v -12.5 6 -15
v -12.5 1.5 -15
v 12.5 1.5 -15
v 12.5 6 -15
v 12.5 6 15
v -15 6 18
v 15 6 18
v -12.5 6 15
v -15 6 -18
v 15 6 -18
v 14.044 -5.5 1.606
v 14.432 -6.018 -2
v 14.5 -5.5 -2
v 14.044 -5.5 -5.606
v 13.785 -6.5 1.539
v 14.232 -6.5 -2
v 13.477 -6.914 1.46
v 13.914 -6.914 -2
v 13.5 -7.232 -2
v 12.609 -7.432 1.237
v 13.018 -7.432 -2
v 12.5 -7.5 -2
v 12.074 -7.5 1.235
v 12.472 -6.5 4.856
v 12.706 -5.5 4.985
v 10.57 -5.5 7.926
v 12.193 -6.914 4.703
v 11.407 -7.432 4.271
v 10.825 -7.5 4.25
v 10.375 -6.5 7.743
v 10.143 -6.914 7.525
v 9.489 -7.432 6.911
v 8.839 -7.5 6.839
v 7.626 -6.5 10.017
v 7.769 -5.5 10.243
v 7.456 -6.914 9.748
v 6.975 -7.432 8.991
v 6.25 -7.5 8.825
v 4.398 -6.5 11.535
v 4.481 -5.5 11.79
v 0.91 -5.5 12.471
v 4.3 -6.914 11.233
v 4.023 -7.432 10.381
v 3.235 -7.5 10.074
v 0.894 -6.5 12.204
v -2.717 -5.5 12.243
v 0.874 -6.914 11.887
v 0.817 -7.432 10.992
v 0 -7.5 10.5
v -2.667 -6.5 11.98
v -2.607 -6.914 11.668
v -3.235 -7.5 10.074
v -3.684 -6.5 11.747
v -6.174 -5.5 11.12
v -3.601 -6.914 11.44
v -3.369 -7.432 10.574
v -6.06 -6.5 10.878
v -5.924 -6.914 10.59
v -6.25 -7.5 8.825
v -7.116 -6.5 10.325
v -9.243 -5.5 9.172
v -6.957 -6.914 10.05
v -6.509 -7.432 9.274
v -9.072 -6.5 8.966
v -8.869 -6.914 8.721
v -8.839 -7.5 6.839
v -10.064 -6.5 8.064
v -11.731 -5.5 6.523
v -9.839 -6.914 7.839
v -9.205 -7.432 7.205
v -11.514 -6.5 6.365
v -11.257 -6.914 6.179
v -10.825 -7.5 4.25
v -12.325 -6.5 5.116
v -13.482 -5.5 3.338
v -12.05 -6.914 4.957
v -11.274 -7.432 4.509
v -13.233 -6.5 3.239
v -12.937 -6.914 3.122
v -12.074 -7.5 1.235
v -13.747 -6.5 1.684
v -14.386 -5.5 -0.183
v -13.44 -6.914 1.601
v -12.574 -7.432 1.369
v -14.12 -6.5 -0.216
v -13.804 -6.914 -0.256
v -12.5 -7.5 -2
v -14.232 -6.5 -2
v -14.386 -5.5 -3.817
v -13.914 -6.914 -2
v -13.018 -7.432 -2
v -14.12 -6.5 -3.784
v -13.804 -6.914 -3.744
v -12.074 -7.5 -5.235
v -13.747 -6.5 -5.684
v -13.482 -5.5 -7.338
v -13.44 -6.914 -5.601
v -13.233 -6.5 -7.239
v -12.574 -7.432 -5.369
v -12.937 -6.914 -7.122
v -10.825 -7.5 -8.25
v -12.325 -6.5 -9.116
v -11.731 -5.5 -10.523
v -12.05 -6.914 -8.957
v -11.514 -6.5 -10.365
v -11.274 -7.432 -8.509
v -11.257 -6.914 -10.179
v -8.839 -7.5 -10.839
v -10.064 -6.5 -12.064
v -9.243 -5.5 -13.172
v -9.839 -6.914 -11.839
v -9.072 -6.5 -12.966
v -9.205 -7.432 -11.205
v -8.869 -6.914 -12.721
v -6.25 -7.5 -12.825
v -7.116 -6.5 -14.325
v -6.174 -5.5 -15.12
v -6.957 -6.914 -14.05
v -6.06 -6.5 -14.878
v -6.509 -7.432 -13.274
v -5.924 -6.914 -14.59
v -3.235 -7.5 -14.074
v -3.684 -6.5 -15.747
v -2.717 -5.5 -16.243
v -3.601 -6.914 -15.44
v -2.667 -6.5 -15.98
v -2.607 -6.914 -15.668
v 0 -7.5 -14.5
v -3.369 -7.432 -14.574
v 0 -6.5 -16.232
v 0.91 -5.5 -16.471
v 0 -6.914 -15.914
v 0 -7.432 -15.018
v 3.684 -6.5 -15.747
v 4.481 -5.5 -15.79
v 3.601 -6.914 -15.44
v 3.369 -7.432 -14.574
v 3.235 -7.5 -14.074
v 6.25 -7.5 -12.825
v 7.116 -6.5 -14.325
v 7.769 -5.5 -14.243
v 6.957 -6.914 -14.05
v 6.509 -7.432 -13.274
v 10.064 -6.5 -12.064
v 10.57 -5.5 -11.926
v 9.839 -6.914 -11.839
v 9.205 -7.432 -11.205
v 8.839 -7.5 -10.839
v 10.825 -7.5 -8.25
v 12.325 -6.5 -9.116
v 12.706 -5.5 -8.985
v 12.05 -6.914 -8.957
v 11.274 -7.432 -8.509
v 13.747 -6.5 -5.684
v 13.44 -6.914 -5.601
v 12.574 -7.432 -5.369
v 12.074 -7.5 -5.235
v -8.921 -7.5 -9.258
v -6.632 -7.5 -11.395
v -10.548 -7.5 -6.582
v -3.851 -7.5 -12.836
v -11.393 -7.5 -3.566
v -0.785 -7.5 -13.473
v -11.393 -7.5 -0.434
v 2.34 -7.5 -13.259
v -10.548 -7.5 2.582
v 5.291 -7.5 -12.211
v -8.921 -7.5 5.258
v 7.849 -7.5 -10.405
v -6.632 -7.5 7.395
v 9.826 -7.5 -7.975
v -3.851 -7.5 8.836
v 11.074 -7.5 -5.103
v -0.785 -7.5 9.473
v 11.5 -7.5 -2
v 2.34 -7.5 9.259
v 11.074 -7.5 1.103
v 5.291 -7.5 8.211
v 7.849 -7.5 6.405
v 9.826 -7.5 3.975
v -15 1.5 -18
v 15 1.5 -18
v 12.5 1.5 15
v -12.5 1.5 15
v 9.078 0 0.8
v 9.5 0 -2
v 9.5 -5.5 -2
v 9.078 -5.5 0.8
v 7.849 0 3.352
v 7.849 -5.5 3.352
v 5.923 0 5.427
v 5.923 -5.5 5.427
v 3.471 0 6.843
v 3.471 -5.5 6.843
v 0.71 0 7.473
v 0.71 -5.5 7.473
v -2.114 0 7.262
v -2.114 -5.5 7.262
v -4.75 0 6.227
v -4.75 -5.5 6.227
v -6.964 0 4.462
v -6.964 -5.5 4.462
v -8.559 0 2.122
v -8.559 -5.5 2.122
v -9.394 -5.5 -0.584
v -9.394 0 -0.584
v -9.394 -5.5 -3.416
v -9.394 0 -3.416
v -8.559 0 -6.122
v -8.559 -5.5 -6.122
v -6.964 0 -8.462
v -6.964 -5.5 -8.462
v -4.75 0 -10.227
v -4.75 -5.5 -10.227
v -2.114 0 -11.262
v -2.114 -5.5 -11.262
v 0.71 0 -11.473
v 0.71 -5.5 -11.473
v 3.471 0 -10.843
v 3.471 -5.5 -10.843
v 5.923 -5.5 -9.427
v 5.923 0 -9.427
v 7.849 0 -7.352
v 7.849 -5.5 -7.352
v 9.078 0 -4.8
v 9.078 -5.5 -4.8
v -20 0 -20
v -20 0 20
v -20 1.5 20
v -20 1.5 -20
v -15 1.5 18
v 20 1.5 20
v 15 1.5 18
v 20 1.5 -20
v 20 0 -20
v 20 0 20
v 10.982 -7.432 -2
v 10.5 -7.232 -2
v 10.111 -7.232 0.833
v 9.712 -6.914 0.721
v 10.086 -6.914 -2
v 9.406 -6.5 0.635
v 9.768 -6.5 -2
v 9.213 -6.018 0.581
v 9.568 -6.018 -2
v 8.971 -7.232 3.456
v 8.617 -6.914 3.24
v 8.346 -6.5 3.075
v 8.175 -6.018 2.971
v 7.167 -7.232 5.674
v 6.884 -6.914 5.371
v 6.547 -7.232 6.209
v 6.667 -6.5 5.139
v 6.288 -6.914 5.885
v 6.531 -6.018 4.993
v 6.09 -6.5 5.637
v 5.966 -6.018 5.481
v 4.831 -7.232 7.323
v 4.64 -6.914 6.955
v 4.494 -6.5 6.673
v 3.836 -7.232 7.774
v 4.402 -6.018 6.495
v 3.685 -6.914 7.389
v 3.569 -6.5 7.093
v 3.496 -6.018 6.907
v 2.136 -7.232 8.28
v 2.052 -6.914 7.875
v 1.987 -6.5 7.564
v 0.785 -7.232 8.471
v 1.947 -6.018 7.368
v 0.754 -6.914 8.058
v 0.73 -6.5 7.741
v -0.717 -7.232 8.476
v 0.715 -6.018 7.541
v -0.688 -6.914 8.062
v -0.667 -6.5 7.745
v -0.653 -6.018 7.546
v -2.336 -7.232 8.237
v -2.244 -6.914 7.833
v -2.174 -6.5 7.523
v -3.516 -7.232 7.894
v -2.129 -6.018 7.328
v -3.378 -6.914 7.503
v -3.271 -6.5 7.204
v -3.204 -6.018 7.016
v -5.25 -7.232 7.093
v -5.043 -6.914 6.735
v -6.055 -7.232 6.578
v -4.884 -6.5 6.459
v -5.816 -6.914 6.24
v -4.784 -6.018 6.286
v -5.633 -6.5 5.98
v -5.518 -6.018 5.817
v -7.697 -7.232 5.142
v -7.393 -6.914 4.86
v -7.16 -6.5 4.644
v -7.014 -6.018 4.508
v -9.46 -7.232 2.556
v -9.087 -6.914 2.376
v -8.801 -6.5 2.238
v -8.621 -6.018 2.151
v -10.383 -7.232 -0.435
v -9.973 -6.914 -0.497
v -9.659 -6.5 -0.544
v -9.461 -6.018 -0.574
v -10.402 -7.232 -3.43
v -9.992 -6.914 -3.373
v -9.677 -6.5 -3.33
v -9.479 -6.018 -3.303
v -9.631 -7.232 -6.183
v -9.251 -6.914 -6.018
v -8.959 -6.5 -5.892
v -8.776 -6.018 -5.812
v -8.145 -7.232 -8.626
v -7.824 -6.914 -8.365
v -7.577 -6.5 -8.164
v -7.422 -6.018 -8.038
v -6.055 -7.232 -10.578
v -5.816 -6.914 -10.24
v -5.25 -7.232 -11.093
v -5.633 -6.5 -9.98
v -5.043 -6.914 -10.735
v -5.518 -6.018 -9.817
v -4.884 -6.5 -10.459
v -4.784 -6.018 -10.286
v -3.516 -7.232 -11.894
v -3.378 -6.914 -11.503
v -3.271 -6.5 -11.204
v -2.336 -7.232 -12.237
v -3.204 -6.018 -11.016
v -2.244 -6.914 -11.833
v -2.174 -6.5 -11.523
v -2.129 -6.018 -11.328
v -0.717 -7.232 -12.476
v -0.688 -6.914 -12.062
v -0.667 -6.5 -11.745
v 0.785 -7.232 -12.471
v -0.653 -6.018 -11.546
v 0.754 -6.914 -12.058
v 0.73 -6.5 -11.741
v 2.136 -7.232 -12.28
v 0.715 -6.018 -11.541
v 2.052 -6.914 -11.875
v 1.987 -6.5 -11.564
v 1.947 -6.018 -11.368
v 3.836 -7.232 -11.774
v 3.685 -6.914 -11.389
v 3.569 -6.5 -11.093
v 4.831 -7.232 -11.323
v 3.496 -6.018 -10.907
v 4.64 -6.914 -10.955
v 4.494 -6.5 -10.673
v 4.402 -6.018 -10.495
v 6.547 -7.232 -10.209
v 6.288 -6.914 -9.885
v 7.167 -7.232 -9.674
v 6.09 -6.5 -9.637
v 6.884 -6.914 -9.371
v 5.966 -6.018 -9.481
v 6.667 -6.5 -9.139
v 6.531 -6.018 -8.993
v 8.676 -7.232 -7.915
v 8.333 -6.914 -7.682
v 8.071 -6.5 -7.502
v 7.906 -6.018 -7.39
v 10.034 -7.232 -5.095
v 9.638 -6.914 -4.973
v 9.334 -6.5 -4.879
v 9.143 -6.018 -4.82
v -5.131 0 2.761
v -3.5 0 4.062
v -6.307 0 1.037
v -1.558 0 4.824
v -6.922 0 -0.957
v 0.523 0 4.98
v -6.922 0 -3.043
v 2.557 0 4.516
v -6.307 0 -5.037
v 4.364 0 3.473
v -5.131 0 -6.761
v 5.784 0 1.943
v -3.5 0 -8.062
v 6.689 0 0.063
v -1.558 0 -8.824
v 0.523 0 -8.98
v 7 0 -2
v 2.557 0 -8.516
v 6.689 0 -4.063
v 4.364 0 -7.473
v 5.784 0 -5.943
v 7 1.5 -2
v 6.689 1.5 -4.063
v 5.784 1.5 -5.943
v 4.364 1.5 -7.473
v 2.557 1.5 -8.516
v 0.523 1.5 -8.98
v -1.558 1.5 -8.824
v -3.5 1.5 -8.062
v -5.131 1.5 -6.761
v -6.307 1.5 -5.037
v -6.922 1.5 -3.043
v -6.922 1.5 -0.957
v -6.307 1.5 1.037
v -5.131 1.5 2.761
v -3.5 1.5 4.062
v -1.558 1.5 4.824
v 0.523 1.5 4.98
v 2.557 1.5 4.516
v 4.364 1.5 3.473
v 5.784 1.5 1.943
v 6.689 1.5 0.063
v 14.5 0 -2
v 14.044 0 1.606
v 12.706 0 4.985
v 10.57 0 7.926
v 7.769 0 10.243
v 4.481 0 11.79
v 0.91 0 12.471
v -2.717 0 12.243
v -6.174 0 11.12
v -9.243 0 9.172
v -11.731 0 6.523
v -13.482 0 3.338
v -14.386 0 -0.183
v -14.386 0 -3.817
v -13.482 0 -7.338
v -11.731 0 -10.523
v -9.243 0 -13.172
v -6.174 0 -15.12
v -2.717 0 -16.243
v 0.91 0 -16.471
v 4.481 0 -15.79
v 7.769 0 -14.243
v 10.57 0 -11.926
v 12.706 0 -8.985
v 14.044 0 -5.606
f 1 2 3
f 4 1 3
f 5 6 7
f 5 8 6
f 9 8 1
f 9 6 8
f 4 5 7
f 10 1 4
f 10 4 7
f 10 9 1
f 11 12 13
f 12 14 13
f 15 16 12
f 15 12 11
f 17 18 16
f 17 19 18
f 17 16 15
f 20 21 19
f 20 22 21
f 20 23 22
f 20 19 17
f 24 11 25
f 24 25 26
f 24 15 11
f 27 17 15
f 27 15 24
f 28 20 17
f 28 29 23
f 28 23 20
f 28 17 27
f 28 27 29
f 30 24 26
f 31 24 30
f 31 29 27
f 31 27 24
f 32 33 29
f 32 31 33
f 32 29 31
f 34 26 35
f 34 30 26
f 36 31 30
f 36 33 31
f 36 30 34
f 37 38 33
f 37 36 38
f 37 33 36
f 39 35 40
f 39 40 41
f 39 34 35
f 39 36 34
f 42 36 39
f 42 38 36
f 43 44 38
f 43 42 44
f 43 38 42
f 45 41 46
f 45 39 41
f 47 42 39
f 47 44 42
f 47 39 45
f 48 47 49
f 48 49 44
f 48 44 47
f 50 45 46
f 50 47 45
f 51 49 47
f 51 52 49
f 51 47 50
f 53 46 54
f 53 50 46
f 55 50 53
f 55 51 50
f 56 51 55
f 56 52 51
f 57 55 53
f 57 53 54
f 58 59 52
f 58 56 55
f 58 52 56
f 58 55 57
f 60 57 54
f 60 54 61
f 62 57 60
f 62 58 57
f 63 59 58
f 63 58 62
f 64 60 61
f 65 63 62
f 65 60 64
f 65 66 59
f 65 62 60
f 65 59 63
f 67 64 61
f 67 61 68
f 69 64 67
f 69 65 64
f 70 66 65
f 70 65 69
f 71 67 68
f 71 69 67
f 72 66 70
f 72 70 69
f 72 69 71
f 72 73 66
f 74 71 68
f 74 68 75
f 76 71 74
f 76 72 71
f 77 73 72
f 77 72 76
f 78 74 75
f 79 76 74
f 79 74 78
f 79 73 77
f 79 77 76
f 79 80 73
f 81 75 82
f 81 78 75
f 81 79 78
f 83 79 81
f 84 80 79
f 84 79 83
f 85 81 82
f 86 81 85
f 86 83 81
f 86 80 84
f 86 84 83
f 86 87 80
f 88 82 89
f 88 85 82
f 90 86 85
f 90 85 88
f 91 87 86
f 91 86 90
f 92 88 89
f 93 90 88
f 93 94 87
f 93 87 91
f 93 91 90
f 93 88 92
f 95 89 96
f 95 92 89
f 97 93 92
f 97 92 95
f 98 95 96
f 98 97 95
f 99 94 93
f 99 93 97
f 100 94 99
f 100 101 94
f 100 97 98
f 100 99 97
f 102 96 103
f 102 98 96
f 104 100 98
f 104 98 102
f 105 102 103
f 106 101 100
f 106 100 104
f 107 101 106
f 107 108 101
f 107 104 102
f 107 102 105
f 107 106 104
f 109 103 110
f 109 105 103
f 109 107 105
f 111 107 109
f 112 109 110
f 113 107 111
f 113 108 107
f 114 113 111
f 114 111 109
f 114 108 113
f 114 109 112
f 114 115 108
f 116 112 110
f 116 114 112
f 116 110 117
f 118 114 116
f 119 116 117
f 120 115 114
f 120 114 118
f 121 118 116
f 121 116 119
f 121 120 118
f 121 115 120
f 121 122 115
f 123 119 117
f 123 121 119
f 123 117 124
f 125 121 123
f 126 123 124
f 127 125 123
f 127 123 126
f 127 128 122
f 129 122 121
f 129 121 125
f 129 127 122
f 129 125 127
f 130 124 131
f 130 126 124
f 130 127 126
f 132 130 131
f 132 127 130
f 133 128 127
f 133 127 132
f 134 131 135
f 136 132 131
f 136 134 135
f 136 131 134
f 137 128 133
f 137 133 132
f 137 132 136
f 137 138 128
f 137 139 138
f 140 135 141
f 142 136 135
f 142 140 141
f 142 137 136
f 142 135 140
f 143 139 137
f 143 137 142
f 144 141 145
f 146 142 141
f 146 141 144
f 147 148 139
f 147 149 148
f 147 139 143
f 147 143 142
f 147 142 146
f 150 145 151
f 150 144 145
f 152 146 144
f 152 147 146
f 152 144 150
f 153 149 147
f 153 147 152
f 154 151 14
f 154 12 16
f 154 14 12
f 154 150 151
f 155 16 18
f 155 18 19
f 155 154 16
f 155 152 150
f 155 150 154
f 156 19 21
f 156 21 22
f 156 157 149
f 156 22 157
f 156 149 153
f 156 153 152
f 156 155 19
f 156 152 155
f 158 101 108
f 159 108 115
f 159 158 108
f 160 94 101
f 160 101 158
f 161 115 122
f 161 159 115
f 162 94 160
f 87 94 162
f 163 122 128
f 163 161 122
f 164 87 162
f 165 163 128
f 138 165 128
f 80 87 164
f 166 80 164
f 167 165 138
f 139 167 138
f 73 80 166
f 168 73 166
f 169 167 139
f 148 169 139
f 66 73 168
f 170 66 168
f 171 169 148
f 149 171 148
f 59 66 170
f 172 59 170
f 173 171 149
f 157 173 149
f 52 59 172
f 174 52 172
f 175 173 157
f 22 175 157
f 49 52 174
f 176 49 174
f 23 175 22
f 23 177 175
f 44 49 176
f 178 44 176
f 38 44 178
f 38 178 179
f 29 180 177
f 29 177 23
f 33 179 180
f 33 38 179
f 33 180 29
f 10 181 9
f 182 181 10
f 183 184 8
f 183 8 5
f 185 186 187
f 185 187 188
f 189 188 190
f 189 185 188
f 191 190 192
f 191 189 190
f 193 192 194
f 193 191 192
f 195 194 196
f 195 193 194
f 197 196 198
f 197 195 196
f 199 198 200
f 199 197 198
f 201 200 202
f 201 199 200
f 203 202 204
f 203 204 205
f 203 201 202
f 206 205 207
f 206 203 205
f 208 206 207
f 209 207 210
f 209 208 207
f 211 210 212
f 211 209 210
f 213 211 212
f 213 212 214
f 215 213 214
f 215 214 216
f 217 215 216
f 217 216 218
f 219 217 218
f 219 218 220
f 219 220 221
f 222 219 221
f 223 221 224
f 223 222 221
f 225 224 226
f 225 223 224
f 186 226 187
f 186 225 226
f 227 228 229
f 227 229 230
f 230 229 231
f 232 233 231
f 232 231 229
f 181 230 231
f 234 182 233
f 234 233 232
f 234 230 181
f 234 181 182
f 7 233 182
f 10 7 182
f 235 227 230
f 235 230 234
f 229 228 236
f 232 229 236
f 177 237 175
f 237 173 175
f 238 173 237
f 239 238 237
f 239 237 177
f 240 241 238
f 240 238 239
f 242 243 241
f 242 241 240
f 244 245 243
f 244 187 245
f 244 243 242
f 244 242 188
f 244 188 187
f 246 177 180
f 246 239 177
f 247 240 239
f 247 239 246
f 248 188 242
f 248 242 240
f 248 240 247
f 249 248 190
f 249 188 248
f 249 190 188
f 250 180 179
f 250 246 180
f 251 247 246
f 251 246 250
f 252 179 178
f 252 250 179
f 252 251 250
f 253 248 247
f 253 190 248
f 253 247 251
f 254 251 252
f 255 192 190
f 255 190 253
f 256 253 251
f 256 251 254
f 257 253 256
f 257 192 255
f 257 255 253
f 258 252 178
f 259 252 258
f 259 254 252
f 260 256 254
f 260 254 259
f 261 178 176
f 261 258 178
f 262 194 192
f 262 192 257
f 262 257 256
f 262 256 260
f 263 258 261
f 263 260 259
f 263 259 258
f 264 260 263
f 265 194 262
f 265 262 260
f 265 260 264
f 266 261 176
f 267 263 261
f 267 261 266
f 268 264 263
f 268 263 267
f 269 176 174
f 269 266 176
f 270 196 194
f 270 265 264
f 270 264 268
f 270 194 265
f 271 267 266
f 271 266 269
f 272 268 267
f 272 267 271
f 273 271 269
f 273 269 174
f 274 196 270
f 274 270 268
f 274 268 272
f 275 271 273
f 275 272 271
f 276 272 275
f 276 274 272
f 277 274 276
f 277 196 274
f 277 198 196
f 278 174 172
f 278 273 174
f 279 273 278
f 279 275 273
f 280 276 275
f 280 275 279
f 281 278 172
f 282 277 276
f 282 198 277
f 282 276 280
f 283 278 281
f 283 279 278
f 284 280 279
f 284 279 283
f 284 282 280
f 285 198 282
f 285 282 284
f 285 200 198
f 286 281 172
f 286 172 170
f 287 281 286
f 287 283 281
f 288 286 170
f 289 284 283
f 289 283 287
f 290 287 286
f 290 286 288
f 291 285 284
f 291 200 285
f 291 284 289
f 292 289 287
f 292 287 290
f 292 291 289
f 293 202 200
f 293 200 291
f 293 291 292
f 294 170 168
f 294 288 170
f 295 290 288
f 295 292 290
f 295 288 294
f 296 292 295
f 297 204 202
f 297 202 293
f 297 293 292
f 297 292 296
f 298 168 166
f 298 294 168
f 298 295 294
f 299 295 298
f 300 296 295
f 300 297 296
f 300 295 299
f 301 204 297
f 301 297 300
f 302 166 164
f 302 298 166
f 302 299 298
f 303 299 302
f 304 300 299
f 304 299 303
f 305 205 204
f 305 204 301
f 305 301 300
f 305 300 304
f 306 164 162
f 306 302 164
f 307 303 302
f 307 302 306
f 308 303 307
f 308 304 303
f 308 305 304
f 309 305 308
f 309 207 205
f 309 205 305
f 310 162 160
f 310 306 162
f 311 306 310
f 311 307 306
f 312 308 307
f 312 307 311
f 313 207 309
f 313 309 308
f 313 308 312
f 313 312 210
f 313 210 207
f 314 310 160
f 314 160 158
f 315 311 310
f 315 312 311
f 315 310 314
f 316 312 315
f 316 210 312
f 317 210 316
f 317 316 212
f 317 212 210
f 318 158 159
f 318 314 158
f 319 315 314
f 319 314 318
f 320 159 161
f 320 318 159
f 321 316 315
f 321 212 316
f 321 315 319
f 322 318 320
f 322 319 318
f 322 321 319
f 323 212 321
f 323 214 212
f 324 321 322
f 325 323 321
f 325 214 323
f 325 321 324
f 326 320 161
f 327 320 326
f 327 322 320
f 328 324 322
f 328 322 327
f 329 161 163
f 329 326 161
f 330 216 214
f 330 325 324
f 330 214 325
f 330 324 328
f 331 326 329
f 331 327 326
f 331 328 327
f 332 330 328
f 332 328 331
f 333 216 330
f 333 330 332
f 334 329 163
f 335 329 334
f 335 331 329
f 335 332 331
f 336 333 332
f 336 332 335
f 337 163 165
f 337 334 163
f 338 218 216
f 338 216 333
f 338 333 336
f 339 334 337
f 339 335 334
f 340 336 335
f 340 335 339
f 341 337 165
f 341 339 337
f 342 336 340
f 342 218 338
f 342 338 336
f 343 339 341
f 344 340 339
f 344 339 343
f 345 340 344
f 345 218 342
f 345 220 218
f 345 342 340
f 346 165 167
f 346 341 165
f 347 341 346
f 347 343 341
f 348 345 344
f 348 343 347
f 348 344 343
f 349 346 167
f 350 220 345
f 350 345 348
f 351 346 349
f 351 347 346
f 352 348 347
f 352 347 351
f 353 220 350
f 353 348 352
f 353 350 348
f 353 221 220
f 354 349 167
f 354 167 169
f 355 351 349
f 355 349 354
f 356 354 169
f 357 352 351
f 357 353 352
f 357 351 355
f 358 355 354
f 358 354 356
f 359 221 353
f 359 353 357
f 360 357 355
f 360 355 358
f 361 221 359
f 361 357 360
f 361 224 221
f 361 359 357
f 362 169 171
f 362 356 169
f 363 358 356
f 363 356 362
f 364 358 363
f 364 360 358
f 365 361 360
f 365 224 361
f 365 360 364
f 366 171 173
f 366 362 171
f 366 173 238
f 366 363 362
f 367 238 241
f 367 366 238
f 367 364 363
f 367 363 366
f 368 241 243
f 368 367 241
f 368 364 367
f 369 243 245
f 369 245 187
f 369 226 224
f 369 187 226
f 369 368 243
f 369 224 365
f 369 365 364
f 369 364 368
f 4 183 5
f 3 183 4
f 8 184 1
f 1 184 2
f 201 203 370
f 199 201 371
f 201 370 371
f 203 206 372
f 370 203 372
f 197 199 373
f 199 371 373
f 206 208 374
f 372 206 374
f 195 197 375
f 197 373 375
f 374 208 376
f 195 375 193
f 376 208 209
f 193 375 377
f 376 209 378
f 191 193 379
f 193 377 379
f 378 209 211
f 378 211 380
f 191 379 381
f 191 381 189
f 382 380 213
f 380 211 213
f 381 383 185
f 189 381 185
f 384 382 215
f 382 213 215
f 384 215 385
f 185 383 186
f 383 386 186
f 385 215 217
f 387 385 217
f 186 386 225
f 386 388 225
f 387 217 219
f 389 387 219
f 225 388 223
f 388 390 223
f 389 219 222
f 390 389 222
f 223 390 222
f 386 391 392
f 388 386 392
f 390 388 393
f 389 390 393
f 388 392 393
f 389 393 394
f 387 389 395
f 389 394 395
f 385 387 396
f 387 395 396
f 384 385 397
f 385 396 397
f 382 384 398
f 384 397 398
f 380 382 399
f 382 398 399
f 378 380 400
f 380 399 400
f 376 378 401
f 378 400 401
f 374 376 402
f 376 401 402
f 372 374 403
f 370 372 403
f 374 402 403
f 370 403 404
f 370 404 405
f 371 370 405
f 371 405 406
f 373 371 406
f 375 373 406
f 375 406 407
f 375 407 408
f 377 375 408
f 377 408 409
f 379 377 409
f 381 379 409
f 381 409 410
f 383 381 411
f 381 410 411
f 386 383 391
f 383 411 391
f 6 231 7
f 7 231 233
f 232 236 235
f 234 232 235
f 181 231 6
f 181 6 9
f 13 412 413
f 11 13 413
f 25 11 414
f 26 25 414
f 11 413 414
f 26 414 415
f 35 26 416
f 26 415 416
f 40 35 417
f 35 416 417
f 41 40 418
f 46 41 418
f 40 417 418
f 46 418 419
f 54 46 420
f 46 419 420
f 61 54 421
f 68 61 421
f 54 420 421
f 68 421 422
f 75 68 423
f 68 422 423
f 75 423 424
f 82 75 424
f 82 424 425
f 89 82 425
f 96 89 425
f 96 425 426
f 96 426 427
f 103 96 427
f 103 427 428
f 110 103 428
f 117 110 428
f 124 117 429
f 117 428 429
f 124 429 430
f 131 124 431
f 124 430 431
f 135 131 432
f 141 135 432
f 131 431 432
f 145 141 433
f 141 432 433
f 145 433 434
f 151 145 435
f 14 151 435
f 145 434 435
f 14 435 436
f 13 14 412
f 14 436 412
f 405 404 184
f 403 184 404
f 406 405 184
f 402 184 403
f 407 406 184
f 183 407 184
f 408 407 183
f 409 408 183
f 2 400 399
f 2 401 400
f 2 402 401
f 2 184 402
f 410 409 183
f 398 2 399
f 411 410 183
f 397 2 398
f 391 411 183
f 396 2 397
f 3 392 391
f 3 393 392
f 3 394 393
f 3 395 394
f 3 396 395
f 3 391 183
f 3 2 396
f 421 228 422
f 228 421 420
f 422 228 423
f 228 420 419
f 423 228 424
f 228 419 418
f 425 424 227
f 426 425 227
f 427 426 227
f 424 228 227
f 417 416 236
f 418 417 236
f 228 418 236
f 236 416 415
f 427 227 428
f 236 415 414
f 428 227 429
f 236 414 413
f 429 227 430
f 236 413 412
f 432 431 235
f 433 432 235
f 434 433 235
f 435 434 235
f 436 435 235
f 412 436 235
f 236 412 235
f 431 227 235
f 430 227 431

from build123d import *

# Parameters (mm, degrees)
CROQUIS1_W              = 40
CROQUIS1_H              = 40
SALIENTE_EXTRUIR1_DEPTH = 1.5
CROQUIS2_R              = 7
CORTAR_EXTRUIR1_DEPTH   = 1.5
CROQUIS3_W              = 30
CROQUIS3_H              = 36
CROQUIS3_W_2            = 25
CROQUIS3_H_2            = 30
SALIENTE_EXTRUIR2_DEPTH = 4.5
CROQUIS4_R              = 14.5
CROQUIS4_R_2            = 9.5
SALIENTE_EXTRUIR3_DEPTH = 7.5
REDONDEO1_R             = 2


with BuildPart() as part:
    # Croquis1 → Saliente-Extruir1 (new body)
    with BuildSketch(Plane(origin=(0, 0, 0), x_dir=(1, 0, 0), z_dir=(0, 1, 0))):
        Rectangle(CROQUIS1_W, CROQUIS1_H)
    extrude(amount=SALIENTE_EXTRUIR1_DEPTH)

    # Croquis2 → Cortar-Extruir1 (cut)
    with BuildSketch(Plane(origin=(0, 1.5, 0), x_dir=(1, 0, 0), z_dir=(0, 1, 0))):
        with Locations((0, 2)):
            Circle(CROQUIS2_R)
    extrude(amount=-CORTAR_EXTRUIR1_DEPTH, mode=Mode.SUBTRACT)

    # Croquis3 → Saliente-Extruir2 (add)
    with BuildSketch(Plane(origin=(0, 1.5, 0), x_dir=(1, 0, 0), z_dir=(0, 1, 0))):
        Rectangle(CROQUIS3_W, CROQUIS3_H)
        Rectangle(CROQUIS3_W_2, CROQUIS3_H_2, mode=Mode.SUBTRACT)
    extrude(amount=SALIENTE_EXTRUIR2_DEPTH)

    # Croquis4 → Saliente-Extruir3 (add)
    with BuildSketch(Plane.XZ):
        with Locations((0, -2)):
            Circle(CROQUIS4_R)
        with Locations((0, -2)):
            Circle(CROQUIS4_R_2, mode=Mode.SUBTRACT)
    extrude(amount=SALIENTE_EXTRUIR3_DEPTH)

    # Redondeo1
    redondeo1_edges = [part.edges().sort_by_distance(p)[0] for p in [
        (-14.5, -7.5, -2),
        (-9.5, -7.5, -2),
    ]]
    fillet(redondeo1_edges, radius=REDONDEO1_R)


solid = part.part
